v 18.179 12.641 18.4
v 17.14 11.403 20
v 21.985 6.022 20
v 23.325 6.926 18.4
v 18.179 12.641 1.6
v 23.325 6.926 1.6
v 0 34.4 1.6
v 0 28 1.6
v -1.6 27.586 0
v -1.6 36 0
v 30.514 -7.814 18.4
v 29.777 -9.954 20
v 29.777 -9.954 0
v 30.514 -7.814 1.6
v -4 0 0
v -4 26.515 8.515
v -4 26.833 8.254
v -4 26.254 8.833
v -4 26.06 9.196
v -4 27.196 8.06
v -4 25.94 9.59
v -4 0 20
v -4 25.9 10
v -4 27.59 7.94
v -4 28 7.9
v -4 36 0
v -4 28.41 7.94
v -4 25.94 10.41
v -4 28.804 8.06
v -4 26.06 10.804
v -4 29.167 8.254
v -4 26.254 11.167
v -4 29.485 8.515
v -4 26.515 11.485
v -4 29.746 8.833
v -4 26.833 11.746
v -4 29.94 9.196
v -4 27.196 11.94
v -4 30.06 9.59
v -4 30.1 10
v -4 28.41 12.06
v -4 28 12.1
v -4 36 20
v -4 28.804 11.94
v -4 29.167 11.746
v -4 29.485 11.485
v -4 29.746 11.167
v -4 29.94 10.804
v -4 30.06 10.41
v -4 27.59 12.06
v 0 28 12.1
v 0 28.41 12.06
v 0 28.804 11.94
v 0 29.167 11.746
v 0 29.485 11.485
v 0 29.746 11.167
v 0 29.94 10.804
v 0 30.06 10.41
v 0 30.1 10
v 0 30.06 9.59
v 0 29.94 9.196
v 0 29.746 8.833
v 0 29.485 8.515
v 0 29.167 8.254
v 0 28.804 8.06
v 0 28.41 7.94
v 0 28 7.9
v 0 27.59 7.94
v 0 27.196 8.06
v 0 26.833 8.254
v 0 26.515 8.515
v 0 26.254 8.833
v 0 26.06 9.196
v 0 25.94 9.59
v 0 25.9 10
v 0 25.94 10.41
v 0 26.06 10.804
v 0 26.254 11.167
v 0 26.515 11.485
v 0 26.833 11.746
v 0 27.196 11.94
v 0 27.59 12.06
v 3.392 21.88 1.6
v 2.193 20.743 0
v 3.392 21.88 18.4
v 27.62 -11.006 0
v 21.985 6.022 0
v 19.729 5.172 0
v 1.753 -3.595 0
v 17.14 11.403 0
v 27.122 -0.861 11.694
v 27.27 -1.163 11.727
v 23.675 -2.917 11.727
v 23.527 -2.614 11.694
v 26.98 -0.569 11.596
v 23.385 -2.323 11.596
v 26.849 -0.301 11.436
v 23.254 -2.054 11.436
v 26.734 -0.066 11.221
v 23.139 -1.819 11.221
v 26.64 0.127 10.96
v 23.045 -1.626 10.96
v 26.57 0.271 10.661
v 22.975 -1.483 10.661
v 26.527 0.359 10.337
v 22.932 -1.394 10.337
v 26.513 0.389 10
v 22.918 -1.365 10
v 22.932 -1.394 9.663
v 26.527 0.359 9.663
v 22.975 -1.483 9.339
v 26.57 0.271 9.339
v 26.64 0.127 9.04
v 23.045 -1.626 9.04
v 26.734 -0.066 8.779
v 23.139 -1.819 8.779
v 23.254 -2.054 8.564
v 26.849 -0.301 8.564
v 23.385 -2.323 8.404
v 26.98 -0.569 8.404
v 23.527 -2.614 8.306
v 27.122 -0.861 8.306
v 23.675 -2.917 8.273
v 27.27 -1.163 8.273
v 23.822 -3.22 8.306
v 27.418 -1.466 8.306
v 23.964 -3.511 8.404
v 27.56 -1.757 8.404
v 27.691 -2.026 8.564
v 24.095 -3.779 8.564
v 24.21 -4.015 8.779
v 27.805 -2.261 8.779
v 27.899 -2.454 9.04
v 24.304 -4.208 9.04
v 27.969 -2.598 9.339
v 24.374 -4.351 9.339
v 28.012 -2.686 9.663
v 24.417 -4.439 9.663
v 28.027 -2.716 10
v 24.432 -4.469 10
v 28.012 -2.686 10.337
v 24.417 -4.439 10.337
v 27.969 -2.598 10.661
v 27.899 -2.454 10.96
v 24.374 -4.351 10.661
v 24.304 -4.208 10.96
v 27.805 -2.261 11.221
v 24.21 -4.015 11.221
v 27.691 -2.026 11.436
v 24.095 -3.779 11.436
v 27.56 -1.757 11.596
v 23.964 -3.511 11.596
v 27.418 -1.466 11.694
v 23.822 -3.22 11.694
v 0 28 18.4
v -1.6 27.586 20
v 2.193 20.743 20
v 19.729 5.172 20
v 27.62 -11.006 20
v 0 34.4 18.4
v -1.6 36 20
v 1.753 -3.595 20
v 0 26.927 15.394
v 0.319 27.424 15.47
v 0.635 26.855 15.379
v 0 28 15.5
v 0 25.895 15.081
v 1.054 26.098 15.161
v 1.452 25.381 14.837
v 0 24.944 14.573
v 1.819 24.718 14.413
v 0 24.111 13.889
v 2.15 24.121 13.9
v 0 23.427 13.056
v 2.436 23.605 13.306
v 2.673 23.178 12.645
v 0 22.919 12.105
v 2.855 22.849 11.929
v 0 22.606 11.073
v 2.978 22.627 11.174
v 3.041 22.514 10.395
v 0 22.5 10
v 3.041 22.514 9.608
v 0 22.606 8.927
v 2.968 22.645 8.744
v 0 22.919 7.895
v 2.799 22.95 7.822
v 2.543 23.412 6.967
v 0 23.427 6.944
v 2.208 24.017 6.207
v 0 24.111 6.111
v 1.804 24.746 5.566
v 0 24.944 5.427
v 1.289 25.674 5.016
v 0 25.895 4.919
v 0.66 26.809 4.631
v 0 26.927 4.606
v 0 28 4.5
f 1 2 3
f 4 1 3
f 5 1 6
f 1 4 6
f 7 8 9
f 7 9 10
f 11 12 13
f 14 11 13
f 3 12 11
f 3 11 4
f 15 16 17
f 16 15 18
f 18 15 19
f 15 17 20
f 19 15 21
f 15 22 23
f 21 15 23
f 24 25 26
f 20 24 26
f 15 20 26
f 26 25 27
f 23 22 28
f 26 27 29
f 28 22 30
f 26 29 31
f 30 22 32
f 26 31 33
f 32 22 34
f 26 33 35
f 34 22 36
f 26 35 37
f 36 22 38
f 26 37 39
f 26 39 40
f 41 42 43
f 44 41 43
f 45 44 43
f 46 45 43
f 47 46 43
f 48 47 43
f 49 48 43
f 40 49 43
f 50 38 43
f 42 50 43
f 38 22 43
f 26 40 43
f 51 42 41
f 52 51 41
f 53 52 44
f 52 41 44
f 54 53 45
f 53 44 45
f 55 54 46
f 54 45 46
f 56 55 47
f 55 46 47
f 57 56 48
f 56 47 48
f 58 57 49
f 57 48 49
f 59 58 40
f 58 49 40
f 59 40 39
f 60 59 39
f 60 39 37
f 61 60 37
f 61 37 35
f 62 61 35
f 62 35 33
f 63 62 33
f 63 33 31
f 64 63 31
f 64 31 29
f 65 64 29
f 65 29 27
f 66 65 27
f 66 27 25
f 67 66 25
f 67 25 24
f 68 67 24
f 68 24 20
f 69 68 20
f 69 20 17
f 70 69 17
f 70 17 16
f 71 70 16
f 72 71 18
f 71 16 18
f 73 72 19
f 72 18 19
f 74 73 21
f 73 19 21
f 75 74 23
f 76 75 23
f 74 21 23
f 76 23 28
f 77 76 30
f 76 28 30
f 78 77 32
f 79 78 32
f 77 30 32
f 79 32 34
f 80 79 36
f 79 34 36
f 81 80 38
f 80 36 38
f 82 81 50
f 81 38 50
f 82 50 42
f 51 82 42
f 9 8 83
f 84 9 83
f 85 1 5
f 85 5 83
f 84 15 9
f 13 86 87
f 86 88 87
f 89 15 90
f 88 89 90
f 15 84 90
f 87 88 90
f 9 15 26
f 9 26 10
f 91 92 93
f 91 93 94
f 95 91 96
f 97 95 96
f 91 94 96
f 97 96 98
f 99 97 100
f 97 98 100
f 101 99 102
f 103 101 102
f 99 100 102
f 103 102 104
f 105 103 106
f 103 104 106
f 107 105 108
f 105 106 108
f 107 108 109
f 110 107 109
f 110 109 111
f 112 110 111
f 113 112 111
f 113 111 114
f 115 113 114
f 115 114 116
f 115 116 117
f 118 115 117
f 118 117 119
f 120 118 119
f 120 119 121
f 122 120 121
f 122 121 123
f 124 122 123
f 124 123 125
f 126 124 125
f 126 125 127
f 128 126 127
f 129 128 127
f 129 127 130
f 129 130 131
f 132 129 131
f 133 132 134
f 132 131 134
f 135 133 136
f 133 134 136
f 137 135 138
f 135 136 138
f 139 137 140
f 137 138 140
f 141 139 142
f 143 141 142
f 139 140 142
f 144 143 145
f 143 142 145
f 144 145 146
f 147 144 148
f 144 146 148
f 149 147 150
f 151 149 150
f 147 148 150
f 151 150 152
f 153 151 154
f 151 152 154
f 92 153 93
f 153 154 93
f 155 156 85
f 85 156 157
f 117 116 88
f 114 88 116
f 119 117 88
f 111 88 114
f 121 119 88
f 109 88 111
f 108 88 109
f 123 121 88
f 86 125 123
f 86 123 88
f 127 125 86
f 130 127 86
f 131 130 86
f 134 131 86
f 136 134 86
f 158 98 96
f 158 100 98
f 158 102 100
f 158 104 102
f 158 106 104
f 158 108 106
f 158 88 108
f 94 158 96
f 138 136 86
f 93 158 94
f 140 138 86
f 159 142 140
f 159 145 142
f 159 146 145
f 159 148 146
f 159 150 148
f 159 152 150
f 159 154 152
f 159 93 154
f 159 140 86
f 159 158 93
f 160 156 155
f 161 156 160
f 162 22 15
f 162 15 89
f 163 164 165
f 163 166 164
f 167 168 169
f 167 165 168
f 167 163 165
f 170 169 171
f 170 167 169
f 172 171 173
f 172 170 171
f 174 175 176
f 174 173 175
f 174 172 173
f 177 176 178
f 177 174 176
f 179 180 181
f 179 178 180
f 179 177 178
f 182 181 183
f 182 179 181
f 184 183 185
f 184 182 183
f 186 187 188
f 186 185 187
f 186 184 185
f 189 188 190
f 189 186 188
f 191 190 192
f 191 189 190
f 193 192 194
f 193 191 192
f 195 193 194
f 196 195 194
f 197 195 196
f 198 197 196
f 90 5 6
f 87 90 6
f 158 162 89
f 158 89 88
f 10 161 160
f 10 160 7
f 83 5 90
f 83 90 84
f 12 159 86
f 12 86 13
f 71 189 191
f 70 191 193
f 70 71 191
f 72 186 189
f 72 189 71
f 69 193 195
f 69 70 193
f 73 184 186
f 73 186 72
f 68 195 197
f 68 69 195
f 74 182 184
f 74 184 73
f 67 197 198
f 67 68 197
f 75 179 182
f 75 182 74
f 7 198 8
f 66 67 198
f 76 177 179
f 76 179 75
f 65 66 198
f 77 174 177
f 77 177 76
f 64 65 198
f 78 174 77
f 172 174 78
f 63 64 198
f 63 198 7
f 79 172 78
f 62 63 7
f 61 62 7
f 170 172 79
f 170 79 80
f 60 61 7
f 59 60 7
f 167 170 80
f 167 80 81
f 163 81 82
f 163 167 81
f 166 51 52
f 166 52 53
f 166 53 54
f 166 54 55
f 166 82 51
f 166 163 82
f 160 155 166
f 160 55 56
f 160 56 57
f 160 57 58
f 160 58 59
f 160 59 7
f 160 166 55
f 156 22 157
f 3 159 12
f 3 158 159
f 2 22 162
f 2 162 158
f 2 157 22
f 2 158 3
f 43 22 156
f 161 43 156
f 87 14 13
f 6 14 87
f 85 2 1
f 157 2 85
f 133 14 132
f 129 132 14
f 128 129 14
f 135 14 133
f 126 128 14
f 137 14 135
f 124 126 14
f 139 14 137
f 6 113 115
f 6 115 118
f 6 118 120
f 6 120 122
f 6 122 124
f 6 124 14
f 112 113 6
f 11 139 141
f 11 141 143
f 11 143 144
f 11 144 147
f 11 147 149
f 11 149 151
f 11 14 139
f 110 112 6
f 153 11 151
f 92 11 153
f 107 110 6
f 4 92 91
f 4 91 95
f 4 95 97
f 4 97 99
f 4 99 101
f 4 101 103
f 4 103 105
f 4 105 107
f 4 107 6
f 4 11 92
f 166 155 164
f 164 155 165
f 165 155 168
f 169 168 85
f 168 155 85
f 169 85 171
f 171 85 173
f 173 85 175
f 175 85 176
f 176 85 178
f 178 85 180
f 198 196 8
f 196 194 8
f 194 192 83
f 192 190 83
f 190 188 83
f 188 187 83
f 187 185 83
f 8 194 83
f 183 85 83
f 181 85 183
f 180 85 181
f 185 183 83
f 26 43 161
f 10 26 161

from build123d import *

# Parameters (mm, degrees)
BOSS_EXTRU_1_DEPTH      = 20
ESQUISSE2_W             = 20
ESQUISSE2_H             = 20
BOSS_EXTRU_2_DEPTH      = 4
ESQUISSE3_W             = 20
ESQUISSE3_H             = 20
BOSS_EXTRU_3_DEPTH      = 4
ESQUISSE4_W             = 4
ESQUISSE4_H             = 16
BOSS_EXTRU_4_DEPTH      = 20
CHANFREIN1_SIZE         = 4
ESQUISSE5_R             = 2.1
ENL_V_MAT_EXTRU_1_DEPTH = 36.215222341
ESQUISSE6_R             = 5.5
ENL_V_MAT_EXTRU_2_DEPTH = 32.215222341
D_GAGEMENT_41_D         = 3.4544
D_GAGEMENT_41_DEPTH     = 10
D_GAGEMENT_41_TIP       = 1.037806461
CHANFREIN2_SIZE         = 1.6


with BuildPart() as part:
    # Esquisse1 → Boss.-Extru.1 (new body)
    with BuildSketch(Plane.XY):
        Polygon((0, 0), (0, 20), (17.975880926, 8.767422936), align=None)
    extrude(amount=BOSS_EXTRU_1_DEPTH)

    # Esquisse2 → Boss.-Extru.2 (add)
    with BuildSketch(Plane.ZY):
        with Locations((10, 10)):
            Rectangle(ESQUISSE2_W, ESQUISSE2_H)
    extrude(amount=BOSS_EXTRU_2_DEPTH)

    # Esquisse3 → Boss.-Extru.3 (add)
    with BuildSketch(Plane(origin=(0, 0, 0), x_dir=(0.898794046, 0.438371147, 0), z_dir=(0.438371147, -0.898794046, 0))):
        with Locations((10, 10)):
            Rectangle(ESQUISSE3_W, ESQUISSE3_H)
    extrude(amount=BOSS_EXTRU_3_DEPTH)

    # Esquisse4 → Boss.-Extru.4 (add)
    with BuildSketch(Plane.XY.offset(20)):
        with Locations((-2, 28)):
            Rectangle(ESQUISSE4_W, ESQUISSE4_H)
        Polygon((0, 24), (0, 20), (17.975880926, 8.767422936), (21.571057111, 10.520907523), align=None)
        Polygon((31.215222341, -9.252561496), (21.571057111, 10.520907523), (17.975880926, 8.767422936), (19.729365513, 5.172246751), (27.620046155, -11.006046083), align=None)
        Polygon((0, 0), (-4, 0), (1.753484587, -3.595176185), align=None)
    extrude(amount=-BOSS_EXTRU_4_DEPTH)

    # Chanfrein1
    chanfrein1_edges = [part.edges().sort_by_distance(p)[0] for p in [
        (0, 24, 10),
        (21.571057111, 10.520907523, 10),
    ]]
    chamfer(chanfrein1_edges, length=CHANFREIN1_SIZE)

    # Esquisse5 → Enlèv. mat.-Extru.1 (cut, through all)
    with BuildSketch(Plane.ZY.offset(4)):
        with Locations((10, 28)):
            Circle(ESQUISSE5_R)
    extrude(amount=-ENL_V_MAT_EXTRU_1_DEPTH, mode=Mode.SUBTRACT)

    # Esquisse6 → Enlèv. mat.-Extru.2 (cut, through all)
    with BuildSketch(Plane(origin=(0, 0, 0), x_dir=(0, 0, -1), z_dir=(1, 0, 0))):
        with Locations((-10, 28)):
            Circle(ESQUISSE6_R)
    extrude(amount=ENL_V_MAT_EXTRU_2_DEPTH, mode=Mode.SUBTRACT)

    # Dégagement #41
    with Locations(Plane(origin=(21.571057111, 10.520907523, 0), x_dir=(0, 0, -1), z_dir=(0.898794046, 0.438371147, 0))):
        with Locations((-10, -13)):
            Hole(D_GAGEMENT_41_D / 2, depth=D_GAGEMENT_41_DEPTH)
            with Locations((0, 0, -(D_GAGEMENT_41_DEPTH + D_GAGEMENT_41_TIP / 2))):  # 118° drill point
                Cone(0, D_GAGEMENT_41_D / 2, D_GAGEMENT_41_TIP, mode=Mode.SUBTRACT)

    # Chanfrein2
    chanfrein2_edges = [part.edges().sort_by_distance(p)[0] for p in [
        (0, 36, 10),
        (27.269882019, -1.163415079, 0),
        (31.215222341, -9.252561496, 10),
        (27.269882019, -1.163415079, 20),
        (10.785528556, 17.260453761, 20),
        (10.785528556, 17.260453761, 0),
        (0, 32, 20),
        (0, 32, 0),
        (20.751703212, 9.783157959, 20),
        (20.751703212, 9.783157959, 0),
        (1.696096192, 24.940161472, 20),
        (1.696096192, 24.940161472, 0),
    ]]
    chamfer(chanfrein2_edges, length=CHANFREIN2_SIZE)


solid = part.part
